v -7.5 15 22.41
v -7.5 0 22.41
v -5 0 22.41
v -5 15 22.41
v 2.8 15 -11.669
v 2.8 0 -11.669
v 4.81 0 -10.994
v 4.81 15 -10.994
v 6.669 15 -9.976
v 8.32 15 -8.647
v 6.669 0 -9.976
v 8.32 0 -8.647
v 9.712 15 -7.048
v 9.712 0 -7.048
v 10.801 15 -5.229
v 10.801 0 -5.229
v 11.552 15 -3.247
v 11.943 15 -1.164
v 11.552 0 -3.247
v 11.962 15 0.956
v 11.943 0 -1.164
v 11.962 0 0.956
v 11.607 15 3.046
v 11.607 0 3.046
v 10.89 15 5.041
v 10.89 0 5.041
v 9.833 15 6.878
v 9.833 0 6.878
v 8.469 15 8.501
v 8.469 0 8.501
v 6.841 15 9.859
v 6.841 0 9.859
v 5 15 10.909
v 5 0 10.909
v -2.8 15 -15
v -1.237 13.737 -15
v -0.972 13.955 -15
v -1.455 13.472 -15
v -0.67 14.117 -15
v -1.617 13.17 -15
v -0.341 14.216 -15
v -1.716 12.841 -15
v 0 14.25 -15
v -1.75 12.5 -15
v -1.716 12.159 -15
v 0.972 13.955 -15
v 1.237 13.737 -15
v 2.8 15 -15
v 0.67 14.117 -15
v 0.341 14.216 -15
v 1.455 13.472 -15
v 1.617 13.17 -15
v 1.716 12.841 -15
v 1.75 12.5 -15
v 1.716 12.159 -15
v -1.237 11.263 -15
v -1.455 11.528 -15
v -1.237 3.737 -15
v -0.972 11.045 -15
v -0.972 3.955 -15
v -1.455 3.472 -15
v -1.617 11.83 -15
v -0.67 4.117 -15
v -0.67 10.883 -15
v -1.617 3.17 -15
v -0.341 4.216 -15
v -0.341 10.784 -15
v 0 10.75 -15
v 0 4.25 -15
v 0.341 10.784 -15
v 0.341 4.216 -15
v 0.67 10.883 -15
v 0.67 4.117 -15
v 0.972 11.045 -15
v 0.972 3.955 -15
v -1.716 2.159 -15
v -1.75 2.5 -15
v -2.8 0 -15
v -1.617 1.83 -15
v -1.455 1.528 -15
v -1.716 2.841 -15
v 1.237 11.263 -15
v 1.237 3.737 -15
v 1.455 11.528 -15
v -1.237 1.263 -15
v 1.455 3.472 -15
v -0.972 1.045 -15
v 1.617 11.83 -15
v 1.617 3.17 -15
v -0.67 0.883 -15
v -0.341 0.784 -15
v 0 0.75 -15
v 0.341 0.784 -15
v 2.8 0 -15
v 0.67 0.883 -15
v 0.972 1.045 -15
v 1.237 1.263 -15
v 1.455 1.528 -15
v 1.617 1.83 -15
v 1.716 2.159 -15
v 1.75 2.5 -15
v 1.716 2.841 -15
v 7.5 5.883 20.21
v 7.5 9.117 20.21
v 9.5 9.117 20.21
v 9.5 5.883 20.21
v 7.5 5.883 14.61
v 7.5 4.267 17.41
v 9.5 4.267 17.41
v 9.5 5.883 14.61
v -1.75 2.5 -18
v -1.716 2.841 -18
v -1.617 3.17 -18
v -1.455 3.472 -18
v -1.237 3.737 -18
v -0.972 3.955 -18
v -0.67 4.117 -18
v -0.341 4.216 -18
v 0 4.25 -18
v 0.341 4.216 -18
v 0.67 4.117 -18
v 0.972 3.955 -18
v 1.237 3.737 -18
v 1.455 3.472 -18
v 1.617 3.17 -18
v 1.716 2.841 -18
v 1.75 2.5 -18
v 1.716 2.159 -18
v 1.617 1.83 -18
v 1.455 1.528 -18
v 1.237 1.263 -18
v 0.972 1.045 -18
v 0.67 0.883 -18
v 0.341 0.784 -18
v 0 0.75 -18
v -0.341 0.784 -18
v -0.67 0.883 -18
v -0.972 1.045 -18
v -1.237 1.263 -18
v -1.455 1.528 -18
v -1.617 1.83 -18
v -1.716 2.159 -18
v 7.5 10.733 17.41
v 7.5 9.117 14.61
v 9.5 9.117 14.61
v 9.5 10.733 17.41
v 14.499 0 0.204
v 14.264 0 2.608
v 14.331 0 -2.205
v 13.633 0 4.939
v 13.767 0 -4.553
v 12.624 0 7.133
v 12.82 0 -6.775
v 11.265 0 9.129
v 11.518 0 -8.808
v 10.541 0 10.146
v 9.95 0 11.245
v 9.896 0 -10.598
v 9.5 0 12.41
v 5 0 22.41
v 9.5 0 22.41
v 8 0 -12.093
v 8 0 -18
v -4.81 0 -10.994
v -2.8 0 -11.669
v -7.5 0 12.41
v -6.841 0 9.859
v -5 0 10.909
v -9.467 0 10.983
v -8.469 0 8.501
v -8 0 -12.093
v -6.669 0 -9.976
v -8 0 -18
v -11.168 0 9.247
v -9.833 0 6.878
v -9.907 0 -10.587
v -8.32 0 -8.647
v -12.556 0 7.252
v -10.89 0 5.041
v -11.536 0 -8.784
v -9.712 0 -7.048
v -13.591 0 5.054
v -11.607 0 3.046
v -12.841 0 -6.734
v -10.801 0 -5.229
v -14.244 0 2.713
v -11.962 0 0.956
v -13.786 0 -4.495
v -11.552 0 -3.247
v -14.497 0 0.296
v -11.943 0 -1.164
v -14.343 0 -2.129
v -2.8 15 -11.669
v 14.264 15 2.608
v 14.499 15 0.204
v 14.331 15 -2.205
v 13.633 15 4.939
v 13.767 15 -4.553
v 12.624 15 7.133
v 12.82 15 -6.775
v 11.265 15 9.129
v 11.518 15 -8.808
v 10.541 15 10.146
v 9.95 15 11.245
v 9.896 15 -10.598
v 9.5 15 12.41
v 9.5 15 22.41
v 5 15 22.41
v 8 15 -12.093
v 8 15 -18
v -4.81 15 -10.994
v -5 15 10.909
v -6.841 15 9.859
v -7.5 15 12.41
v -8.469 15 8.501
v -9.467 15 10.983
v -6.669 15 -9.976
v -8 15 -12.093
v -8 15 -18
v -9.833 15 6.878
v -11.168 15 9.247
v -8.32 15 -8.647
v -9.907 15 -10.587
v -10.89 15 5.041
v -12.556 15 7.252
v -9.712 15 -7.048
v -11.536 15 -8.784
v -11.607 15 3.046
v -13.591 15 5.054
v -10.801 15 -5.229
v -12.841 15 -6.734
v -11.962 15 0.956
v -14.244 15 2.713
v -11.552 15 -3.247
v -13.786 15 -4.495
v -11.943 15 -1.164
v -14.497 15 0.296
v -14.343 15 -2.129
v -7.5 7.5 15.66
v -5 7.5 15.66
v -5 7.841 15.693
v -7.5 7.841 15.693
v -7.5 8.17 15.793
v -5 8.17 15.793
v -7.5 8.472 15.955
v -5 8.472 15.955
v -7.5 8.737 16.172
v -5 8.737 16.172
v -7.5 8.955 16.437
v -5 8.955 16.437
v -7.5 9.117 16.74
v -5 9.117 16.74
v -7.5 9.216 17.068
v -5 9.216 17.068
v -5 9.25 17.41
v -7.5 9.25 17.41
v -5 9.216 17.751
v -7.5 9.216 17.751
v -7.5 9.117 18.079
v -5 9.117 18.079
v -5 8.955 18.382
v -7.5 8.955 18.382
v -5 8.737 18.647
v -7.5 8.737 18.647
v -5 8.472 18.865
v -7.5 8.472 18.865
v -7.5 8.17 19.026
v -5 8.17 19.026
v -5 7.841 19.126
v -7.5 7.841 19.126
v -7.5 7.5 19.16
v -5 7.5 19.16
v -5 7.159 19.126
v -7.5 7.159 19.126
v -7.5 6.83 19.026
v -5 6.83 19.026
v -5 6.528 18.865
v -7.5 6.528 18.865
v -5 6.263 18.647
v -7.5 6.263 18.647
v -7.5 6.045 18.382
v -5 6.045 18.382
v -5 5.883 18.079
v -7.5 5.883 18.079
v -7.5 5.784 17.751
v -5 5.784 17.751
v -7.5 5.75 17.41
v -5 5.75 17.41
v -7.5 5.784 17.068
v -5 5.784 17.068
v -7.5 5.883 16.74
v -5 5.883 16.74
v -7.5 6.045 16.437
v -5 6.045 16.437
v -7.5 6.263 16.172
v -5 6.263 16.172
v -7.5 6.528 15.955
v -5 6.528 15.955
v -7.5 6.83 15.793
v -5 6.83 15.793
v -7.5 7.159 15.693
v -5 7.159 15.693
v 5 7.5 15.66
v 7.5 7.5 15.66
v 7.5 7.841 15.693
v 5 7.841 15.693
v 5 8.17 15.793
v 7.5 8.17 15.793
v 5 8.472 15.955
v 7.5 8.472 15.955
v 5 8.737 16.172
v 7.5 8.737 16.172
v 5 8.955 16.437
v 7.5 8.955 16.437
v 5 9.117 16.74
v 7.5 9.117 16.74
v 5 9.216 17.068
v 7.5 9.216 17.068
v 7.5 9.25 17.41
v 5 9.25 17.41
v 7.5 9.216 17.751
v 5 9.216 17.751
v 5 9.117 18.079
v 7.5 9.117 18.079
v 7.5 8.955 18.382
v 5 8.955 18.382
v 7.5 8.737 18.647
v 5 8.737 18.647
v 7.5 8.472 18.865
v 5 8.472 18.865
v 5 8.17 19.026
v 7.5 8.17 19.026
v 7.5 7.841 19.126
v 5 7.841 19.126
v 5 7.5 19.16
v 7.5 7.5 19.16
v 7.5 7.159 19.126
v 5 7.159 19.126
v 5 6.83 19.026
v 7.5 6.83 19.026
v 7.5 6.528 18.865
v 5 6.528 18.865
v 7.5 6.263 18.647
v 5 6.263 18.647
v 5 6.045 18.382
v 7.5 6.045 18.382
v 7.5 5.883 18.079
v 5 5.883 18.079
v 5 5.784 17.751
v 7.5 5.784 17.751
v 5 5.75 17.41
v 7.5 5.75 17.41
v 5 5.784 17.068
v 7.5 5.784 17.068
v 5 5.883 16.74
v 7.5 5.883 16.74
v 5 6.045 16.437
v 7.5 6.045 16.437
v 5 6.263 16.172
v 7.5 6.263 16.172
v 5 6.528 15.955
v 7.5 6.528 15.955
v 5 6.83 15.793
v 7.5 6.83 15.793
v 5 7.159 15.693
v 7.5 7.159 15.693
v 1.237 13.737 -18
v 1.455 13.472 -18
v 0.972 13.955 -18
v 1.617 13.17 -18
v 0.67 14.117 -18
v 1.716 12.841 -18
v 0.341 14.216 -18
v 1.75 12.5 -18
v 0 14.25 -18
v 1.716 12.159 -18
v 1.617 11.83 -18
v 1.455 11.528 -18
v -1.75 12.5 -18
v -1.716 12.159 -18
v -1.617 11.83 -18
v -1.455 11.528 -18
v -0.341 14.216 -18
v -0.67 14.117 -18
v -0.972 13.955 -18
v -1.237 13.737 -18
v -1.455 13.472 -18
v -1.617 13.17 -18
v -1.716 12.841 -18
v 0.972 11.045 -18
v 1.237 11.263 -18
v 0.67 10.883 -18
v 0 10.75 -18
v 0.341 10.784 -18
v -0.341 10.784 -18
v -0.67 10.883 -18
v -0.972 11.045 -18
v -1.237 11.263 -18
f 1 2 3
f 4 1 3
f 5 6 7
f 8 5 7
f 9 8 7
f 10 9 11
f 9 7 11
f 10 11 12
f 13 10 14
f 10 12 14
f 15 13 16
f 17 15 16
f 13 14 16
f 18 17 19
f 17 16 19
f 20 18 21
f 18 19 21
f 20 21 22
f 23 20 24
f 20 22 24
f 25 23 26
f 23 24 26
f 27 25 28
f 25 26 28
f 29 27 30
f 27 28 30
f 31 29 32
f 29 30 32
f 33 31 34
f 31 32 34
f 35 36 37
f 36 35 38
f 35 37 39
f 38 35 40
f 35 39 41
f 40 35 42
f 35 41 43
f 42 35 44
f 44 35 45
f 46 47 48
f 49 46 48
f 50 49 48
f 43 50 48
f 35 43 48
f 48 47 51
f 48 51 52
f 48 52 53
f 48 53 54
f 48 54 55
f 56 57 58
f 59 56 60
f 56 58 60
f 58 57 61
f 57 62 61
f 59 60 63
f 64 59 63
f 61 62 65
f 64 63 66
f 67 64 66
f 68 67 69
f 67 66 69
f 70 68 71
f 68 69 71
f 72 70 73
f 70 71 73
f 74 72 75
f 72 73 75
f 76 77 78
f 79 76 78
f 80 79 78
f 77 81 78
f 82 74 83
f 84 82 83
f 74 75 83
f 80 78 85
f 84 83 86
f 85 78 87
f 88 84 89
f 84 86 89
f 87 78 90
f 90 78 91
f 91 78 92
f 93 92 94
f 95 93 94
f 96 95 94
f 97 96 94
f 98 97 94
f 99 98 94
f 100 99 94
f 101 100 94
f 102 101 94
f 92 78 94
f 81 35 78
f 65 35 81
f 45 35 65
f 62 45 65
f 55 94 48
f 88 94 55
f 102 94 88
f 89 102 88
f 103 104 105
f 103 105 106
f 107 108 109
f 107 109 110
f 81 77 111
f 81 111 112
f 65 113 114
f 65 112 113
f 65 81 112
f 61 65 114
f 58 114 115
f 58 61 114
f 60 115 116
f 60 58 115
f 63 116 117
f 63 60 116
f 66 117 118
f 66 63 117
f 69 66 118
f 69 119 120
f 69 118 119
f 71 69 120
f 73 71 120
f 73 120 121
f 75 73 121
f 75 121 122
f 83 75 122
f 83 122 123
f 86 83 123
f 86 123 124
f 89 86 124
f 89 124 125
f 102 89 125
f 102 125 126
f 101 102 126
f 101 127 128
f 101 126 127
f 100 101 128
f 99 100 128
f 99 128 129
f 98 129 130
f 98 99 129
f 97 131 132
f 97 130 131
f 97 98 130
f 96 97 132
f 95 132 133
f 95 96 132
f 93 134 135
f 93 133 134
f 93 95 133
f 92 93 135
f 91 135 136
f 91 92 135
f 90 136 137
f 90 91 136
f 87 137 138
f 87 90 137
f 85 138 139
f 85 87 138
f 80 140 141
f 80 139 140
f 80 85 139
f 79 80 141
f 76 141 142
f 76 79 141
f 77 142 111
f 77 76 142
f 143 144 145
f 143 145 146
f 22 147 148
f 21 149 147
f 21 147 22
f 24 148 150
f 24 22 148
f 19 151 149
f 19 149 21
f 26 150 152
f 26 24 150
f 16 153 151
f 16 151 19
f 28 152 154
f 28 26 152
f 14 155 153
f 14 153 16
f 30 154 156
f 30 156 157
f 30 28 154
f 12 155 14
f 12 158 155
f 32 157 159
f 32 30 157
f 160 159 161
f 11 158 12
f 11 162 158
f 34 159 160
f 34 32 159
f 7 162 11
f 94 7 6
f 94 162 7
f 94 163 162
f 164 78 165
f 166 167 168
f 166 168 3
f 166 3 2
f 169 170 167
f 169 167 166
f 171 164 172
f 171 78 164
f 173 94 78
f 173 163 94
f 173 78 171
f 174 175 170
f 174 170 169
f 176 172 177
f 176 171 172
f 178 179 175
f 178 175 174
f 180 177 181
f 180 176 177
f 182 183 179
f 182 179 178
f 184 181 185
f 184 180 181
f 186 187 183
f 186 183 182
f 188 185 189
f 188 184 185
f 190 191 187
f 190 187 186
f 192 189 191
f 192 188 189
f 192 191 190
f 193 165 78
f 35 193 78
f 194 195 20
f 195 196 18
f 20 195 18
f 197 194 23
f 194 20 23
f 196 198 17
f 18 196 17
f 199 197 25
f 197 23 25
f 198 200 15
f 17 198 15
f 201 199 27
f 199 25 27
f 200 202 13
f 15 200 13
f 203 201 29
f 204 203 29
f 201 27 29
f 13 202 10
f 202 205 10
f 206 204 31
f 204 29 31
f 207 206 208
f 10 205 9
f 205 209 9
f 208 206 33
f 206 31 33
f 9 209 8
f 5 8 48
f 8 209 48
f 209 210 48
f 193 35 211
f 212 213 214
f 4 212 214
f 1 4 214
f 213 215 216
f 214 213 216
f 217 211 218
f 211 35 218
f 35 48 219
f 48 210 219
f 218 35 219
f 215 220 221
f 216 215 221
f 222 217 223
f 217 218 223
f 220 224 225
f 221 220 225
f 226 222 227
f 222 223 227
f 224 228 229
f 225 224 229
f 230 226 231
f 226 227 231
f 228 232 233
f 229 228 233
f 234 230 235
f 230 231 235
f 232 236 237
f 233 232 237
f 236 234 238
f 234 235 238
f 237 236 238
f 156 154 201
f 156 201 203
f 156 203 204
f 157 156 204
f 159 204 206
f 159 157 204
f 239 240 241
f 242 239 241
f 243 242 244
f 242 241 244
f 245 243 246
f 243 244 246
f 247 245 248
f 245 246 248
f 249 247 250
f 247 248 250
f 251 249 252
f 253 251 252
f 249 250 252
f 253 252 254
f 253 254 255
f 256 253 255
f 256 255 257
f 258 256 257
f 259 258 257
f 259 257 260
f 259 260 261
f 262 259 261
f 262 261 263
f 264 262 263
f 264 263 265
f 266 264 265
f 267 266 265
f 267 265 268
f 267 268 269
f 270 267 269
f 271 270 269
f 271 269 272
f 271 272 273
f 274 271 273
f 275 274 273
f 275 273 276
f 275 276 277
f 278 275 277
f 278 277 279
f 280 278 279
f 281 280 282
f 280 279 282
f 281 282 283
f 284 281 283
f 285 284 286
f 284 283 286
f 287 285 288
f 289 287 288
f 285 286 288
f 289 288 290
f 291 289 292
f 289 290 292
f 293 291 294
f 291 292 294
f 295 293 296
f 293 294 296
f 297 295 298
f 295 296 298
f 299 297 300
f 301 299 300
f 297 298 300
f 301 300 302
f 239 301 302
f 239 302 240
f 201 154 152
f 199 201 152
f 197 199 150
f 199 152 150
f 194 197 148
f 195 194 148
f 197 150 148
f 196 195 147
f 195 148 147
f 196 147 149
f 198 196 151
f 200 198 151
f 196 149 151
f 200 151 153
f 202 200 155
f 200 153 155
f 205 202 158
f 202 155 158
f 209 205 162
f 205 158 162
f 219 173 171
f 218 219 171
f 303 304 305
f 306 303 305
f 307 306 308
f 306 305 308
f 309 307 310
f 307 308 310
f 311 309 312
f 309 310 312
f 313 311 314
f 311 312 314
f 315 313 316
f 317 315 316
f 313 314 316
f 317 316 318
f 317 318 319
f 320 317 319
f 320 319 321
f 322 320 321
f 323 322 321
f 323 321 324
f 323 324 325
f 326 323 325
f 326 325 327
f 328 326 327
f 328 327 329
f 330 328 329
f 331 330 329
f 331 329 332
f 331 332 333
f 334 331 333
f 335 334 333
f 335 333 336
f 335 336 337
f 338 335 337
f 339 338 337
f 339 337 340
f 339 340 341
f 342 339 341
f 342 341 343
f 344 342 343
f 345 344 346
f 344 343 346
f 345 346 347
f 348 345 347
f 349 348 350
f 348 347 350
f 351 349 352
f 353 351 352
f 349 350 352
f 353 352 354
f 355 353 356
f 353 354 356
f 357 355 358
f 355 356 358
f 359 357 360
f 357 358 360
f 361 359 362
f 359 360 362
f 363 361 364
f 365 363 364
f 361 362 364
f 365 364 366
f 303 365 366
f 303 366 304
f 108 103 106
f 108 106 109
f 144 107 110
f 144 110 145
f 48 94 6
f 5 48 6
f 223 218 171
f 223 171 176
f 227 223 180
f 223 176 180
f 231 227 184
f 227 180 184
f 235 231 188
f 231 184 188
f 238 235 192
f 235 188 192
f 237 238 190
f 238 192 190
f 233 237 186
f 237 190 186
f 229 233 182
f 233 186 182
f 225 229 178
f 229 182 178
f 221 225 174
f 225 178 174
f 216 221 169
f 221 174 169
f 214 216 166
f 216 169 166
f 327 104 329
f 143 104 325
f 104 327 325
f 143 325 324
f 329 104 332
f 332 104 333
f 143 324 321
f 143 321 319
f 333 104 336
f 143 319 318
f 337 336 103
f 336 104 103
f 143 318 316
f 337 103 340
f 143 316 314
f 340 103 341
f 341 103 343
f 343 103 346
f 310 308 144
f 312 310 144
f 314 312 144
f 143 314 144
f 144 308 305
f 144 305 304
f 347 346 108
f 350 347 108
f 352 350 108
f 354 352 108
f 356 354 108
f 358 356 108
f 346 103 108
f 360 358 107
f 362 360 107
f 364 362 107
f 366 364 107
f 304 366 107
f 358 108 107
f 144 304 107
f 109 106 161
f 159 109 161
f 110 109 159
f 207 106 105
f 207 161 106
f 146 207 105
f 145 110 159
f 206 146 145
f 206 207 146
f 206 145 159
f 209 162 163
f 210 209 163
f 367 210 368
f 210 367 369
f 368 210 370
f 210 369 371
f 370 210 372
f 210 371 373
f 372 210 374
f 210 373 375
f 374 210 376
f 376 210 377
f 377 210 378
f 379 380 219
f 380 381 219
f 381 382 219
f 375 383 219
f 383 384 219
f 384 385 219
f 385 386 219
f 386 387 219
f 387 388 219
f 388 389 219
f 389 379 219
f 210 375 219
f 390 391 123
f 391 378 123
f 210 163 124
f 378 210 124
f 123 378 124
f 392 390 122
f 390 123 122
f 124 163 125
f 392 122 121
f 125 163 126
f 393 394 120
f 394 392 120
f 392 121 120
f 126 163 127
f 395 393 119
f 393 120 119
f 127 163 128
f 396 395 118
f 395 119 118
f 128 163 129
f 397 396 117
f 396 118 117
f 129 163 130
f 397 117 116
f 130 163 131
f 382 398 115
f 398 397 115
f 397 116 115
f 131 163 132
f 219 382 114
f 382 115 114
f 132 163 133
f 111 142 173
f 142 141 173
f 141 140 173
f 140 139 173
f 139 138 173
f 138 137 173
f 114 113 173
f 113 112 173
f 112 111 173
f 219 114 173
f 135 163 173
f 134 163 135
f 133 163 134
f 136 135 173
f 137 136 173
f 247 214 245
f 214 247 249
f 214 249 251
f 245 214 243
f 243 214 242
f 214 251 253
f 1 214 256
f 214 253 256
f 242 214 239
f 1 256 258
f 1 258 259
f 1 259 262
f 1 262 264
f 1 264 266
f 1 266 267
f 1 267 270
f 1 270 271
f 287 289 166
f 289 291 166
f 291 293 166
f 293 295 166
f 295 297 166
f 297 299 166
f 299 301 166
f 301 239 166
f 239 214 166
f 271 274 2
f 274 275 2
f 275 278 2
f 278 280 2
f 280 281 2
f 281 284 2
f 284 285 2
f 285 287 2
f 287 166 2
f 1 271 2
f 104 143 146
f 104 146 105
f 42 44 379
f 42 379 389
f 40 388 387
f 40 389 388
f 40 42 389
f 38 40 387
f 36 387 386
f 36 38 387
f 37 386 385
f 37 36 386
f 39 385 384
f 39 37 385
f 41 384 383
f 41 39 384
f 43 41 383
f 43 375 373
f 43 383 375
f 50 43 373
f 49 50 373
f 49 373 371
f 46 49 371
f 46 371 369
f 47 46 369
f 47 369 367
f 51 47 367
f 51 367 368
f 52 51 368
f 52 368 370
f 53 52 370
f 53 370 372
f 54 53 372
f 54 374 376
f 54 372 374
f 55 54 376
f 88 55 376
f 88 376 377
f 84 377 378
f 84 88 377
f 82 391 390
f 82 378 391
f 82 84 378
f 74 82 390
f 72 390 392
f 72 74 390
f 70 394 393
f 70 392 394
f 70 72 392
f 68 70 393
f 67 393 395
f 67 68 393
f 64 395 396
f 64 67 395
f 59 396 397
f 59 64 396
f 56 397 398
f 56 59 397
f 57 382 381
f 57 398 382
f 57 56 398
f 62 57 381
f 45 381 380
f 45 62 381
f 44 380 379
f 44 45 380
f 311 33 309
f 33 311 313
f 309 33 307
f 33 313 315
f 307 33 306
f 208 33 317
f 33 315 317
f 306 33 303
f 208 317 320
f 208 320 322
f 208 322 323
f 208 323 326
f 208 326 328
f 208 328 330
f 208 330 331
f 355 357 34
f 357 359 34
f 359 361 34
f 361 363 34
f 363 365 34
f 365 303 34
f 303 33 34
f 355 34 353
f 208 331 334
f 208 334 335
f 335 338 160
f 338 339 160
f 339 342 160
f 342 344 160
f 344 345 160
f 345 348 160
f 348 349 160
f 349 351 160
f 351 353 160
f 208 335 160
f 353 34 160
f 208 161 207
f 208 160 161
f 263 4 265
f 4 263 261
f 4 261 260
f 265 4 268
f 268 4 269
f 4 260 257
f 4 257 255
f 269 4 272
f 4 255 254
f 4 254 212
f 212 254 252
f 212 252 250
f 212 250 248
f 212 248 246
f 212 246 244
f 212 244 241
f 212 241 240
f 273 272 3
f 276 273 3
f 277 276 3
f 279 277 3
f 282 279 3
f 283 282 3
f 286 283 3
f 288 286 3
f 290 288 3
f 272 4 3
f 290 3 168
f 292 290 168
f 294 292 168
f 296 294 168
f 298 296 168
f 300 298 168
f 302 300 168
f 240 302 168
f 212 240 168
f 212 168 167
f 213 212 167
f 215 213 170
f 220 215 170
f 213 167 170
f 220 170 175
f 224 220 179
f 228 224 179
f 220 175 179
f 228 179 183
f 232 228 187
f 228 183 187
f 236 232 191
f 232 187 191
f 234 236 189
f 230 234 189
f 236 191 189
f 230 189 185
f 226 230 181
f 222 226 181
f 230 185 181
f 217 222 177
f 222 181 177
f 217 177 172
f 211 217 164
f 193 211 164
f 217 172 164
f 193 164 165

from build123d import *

# Parameters (mm, degrees)
RESSALTO_EXTRUS_O6_DEPTH   = 15
CORTE_EXTRUS_O1_DEPTH      = 46.47737596
CORTE_EXTRUS_O1_DEPTH_BACK = 46.47737596
ESBO_O14_R                 = 1.75
ESBO_O15_R                 = 1.75
CORTE_EXTRUS_O2_DEPTH      = 35.802205001
ESBO_O17_W                 = 10
ESBO_O17_H                 = 15
RESSALTO_EXTRUS_O7_DEPTH   = 2
FILETE1_R                  = 10


with BuildPart() as part:
    # Esboço13 → Ressalto-extrusão6 (new body)
    with BuildSketch(Plane(origin=(0, 0, 0), x_dir=(1, 0, 0), z_dir=(0, 1, 0))):
        with BuildLine():
            Line((-2.8, 15), (0, 15))
            Line((0, 15), (0, 15.348469228))
            Line((0, 15.348469228), (0, 16.348469228))
            Line((0, 16.348469228), (0, 18))
            Line((0, 18), (-8, 18))
            Line((-8, 18), (-8, 12.093386622))
            ThreePointArc((-8, 12.093386622), (-14.496982121, -0.295819827), (-7.5, -12.409673646))
            Line((-7.5, -12.409673646), (-7.5, -22.409673646))
            Line((-7.5, -22.409673646), (-5, -22.409673646))
            Line((-5, -22.409673646), (-5, -10.908712115))
            ThreePointArc((-5, -10.908712115), (-11.943432553, 1.16379502), (-2.8, 11.668761717))
            Line((-2.8, 11.668761717), (-2.8, 15))
        make_face()
        with BuildLine():
            ThreePointArc((2.8, 11.668761717), (11.943432553, 1.16379502), (5, -10.908712115))
            Line((5, -10.908712115), (5, -22.409673646))
            Line((5, -22.409673646), (7.5, -22.409673646))
            Line((7.5, -22.409673646), (7.5, -12.409673646))
            ThreePointArc((7.5, -12.409673646), (14.496982121, -0.295819827), (8, 12.093386622))
            Line((8, 12.093386622), (8, 18))
            Line((8, 18), (0, 18))
            Line((0, 18), (0, 16.348469228))
            Line((0, 16.348469228), (0, 15.348469228))
            Line((0, 15.348469228), (0, 15))
            Line((0, 15), (2.8, 15))
            Line((2.8, 15), (2.8, 11.668761717))
        make_face()
    extrude(amount=RESSALTO_EXTRUS_O6_DEPTH)

    # Esboço14 → Corte-extrusão1 (cut, two sides: drawn at the far end of the back side and taken through both)
    with BuildSketch(Plane(origin=(0, 0, -18), x_dir=(-1, 0, 0), z_dir=(0, 0, -1)).offset(-CORTE_EXTRUS_O1_DEPTH_BACK)):
        with Locations((0, 12.5)):
            Circle(ESBO_O14_R)
        with Locations((0, 2.5)):
            Circle(ESBO_O14_R)
    extrude(amount=CORTE_EXTRUS_O1_DEPTH + CORTE_EXTRUS_O1_DEPTH_BACK, mode=Mode.SUBTRACT)

    # Esboço15 → Corte-extrusão2 (cut, through all)
    with BuildSketch(Plane(origin=(7.5, 0, 0), x_dir=(0, 0, -1), z_dir=(1, 0, 0))):
        with Locations((-17.409673646, 7.5)):
            Circle(ESBO_O15_R)
    extrude(amount=-CORTE_EXTRUS_O2_DEPTH, mode=Mode.SUBTRACT)

    # Esboço17 → Ressalto-extrusão7 (add)
    with BuildSketch(Plane(origin=(7.5, 0, 0), x_dir=(0, 0, -1), z_dir=(1, 0, 0))):
        with Locations((-17.409673646, 7.5)):
            Rectangle(ESBO_O17_W, ESBO_O17_H)
        Polygon((-17.409673646, 10.733161507), (-20.209673646, 9.116580754), (-20.209673646, 5.883419246), (-17.409673646, 4.266838493), (-14.609673646, 5.883419246), (-14.609673646, 9.116580754), align=None, mode=Mode.SUBTRACT)
    extrude(amount=RESSALTO_EXTRUS_O7_DEPTH)

    # Filete1
    # the kernel refuses this fillet: 10 mm, written as the material it adds along each edge
    with BuildSketch(Plane(origin=(7.5, 0, 12.409673646), x_dir=(0.7539844158894258, 0, -0.656892305173292), z_dir=(0, 1, 0))) as filete1_piece_1:
        with BuildLine():
            CenterArc((6.715896851, -9.850615741), FILETE1_R, 99.91590085, 21.469545267)
            Line((1.507968832, -1.31378461), (0, 0))
            ThreePointArc((0, 0), (2.496936009, -0.216607176), (4.993872017, 0))
        make_face()
    extrude(amount=15)


solid = part.part
